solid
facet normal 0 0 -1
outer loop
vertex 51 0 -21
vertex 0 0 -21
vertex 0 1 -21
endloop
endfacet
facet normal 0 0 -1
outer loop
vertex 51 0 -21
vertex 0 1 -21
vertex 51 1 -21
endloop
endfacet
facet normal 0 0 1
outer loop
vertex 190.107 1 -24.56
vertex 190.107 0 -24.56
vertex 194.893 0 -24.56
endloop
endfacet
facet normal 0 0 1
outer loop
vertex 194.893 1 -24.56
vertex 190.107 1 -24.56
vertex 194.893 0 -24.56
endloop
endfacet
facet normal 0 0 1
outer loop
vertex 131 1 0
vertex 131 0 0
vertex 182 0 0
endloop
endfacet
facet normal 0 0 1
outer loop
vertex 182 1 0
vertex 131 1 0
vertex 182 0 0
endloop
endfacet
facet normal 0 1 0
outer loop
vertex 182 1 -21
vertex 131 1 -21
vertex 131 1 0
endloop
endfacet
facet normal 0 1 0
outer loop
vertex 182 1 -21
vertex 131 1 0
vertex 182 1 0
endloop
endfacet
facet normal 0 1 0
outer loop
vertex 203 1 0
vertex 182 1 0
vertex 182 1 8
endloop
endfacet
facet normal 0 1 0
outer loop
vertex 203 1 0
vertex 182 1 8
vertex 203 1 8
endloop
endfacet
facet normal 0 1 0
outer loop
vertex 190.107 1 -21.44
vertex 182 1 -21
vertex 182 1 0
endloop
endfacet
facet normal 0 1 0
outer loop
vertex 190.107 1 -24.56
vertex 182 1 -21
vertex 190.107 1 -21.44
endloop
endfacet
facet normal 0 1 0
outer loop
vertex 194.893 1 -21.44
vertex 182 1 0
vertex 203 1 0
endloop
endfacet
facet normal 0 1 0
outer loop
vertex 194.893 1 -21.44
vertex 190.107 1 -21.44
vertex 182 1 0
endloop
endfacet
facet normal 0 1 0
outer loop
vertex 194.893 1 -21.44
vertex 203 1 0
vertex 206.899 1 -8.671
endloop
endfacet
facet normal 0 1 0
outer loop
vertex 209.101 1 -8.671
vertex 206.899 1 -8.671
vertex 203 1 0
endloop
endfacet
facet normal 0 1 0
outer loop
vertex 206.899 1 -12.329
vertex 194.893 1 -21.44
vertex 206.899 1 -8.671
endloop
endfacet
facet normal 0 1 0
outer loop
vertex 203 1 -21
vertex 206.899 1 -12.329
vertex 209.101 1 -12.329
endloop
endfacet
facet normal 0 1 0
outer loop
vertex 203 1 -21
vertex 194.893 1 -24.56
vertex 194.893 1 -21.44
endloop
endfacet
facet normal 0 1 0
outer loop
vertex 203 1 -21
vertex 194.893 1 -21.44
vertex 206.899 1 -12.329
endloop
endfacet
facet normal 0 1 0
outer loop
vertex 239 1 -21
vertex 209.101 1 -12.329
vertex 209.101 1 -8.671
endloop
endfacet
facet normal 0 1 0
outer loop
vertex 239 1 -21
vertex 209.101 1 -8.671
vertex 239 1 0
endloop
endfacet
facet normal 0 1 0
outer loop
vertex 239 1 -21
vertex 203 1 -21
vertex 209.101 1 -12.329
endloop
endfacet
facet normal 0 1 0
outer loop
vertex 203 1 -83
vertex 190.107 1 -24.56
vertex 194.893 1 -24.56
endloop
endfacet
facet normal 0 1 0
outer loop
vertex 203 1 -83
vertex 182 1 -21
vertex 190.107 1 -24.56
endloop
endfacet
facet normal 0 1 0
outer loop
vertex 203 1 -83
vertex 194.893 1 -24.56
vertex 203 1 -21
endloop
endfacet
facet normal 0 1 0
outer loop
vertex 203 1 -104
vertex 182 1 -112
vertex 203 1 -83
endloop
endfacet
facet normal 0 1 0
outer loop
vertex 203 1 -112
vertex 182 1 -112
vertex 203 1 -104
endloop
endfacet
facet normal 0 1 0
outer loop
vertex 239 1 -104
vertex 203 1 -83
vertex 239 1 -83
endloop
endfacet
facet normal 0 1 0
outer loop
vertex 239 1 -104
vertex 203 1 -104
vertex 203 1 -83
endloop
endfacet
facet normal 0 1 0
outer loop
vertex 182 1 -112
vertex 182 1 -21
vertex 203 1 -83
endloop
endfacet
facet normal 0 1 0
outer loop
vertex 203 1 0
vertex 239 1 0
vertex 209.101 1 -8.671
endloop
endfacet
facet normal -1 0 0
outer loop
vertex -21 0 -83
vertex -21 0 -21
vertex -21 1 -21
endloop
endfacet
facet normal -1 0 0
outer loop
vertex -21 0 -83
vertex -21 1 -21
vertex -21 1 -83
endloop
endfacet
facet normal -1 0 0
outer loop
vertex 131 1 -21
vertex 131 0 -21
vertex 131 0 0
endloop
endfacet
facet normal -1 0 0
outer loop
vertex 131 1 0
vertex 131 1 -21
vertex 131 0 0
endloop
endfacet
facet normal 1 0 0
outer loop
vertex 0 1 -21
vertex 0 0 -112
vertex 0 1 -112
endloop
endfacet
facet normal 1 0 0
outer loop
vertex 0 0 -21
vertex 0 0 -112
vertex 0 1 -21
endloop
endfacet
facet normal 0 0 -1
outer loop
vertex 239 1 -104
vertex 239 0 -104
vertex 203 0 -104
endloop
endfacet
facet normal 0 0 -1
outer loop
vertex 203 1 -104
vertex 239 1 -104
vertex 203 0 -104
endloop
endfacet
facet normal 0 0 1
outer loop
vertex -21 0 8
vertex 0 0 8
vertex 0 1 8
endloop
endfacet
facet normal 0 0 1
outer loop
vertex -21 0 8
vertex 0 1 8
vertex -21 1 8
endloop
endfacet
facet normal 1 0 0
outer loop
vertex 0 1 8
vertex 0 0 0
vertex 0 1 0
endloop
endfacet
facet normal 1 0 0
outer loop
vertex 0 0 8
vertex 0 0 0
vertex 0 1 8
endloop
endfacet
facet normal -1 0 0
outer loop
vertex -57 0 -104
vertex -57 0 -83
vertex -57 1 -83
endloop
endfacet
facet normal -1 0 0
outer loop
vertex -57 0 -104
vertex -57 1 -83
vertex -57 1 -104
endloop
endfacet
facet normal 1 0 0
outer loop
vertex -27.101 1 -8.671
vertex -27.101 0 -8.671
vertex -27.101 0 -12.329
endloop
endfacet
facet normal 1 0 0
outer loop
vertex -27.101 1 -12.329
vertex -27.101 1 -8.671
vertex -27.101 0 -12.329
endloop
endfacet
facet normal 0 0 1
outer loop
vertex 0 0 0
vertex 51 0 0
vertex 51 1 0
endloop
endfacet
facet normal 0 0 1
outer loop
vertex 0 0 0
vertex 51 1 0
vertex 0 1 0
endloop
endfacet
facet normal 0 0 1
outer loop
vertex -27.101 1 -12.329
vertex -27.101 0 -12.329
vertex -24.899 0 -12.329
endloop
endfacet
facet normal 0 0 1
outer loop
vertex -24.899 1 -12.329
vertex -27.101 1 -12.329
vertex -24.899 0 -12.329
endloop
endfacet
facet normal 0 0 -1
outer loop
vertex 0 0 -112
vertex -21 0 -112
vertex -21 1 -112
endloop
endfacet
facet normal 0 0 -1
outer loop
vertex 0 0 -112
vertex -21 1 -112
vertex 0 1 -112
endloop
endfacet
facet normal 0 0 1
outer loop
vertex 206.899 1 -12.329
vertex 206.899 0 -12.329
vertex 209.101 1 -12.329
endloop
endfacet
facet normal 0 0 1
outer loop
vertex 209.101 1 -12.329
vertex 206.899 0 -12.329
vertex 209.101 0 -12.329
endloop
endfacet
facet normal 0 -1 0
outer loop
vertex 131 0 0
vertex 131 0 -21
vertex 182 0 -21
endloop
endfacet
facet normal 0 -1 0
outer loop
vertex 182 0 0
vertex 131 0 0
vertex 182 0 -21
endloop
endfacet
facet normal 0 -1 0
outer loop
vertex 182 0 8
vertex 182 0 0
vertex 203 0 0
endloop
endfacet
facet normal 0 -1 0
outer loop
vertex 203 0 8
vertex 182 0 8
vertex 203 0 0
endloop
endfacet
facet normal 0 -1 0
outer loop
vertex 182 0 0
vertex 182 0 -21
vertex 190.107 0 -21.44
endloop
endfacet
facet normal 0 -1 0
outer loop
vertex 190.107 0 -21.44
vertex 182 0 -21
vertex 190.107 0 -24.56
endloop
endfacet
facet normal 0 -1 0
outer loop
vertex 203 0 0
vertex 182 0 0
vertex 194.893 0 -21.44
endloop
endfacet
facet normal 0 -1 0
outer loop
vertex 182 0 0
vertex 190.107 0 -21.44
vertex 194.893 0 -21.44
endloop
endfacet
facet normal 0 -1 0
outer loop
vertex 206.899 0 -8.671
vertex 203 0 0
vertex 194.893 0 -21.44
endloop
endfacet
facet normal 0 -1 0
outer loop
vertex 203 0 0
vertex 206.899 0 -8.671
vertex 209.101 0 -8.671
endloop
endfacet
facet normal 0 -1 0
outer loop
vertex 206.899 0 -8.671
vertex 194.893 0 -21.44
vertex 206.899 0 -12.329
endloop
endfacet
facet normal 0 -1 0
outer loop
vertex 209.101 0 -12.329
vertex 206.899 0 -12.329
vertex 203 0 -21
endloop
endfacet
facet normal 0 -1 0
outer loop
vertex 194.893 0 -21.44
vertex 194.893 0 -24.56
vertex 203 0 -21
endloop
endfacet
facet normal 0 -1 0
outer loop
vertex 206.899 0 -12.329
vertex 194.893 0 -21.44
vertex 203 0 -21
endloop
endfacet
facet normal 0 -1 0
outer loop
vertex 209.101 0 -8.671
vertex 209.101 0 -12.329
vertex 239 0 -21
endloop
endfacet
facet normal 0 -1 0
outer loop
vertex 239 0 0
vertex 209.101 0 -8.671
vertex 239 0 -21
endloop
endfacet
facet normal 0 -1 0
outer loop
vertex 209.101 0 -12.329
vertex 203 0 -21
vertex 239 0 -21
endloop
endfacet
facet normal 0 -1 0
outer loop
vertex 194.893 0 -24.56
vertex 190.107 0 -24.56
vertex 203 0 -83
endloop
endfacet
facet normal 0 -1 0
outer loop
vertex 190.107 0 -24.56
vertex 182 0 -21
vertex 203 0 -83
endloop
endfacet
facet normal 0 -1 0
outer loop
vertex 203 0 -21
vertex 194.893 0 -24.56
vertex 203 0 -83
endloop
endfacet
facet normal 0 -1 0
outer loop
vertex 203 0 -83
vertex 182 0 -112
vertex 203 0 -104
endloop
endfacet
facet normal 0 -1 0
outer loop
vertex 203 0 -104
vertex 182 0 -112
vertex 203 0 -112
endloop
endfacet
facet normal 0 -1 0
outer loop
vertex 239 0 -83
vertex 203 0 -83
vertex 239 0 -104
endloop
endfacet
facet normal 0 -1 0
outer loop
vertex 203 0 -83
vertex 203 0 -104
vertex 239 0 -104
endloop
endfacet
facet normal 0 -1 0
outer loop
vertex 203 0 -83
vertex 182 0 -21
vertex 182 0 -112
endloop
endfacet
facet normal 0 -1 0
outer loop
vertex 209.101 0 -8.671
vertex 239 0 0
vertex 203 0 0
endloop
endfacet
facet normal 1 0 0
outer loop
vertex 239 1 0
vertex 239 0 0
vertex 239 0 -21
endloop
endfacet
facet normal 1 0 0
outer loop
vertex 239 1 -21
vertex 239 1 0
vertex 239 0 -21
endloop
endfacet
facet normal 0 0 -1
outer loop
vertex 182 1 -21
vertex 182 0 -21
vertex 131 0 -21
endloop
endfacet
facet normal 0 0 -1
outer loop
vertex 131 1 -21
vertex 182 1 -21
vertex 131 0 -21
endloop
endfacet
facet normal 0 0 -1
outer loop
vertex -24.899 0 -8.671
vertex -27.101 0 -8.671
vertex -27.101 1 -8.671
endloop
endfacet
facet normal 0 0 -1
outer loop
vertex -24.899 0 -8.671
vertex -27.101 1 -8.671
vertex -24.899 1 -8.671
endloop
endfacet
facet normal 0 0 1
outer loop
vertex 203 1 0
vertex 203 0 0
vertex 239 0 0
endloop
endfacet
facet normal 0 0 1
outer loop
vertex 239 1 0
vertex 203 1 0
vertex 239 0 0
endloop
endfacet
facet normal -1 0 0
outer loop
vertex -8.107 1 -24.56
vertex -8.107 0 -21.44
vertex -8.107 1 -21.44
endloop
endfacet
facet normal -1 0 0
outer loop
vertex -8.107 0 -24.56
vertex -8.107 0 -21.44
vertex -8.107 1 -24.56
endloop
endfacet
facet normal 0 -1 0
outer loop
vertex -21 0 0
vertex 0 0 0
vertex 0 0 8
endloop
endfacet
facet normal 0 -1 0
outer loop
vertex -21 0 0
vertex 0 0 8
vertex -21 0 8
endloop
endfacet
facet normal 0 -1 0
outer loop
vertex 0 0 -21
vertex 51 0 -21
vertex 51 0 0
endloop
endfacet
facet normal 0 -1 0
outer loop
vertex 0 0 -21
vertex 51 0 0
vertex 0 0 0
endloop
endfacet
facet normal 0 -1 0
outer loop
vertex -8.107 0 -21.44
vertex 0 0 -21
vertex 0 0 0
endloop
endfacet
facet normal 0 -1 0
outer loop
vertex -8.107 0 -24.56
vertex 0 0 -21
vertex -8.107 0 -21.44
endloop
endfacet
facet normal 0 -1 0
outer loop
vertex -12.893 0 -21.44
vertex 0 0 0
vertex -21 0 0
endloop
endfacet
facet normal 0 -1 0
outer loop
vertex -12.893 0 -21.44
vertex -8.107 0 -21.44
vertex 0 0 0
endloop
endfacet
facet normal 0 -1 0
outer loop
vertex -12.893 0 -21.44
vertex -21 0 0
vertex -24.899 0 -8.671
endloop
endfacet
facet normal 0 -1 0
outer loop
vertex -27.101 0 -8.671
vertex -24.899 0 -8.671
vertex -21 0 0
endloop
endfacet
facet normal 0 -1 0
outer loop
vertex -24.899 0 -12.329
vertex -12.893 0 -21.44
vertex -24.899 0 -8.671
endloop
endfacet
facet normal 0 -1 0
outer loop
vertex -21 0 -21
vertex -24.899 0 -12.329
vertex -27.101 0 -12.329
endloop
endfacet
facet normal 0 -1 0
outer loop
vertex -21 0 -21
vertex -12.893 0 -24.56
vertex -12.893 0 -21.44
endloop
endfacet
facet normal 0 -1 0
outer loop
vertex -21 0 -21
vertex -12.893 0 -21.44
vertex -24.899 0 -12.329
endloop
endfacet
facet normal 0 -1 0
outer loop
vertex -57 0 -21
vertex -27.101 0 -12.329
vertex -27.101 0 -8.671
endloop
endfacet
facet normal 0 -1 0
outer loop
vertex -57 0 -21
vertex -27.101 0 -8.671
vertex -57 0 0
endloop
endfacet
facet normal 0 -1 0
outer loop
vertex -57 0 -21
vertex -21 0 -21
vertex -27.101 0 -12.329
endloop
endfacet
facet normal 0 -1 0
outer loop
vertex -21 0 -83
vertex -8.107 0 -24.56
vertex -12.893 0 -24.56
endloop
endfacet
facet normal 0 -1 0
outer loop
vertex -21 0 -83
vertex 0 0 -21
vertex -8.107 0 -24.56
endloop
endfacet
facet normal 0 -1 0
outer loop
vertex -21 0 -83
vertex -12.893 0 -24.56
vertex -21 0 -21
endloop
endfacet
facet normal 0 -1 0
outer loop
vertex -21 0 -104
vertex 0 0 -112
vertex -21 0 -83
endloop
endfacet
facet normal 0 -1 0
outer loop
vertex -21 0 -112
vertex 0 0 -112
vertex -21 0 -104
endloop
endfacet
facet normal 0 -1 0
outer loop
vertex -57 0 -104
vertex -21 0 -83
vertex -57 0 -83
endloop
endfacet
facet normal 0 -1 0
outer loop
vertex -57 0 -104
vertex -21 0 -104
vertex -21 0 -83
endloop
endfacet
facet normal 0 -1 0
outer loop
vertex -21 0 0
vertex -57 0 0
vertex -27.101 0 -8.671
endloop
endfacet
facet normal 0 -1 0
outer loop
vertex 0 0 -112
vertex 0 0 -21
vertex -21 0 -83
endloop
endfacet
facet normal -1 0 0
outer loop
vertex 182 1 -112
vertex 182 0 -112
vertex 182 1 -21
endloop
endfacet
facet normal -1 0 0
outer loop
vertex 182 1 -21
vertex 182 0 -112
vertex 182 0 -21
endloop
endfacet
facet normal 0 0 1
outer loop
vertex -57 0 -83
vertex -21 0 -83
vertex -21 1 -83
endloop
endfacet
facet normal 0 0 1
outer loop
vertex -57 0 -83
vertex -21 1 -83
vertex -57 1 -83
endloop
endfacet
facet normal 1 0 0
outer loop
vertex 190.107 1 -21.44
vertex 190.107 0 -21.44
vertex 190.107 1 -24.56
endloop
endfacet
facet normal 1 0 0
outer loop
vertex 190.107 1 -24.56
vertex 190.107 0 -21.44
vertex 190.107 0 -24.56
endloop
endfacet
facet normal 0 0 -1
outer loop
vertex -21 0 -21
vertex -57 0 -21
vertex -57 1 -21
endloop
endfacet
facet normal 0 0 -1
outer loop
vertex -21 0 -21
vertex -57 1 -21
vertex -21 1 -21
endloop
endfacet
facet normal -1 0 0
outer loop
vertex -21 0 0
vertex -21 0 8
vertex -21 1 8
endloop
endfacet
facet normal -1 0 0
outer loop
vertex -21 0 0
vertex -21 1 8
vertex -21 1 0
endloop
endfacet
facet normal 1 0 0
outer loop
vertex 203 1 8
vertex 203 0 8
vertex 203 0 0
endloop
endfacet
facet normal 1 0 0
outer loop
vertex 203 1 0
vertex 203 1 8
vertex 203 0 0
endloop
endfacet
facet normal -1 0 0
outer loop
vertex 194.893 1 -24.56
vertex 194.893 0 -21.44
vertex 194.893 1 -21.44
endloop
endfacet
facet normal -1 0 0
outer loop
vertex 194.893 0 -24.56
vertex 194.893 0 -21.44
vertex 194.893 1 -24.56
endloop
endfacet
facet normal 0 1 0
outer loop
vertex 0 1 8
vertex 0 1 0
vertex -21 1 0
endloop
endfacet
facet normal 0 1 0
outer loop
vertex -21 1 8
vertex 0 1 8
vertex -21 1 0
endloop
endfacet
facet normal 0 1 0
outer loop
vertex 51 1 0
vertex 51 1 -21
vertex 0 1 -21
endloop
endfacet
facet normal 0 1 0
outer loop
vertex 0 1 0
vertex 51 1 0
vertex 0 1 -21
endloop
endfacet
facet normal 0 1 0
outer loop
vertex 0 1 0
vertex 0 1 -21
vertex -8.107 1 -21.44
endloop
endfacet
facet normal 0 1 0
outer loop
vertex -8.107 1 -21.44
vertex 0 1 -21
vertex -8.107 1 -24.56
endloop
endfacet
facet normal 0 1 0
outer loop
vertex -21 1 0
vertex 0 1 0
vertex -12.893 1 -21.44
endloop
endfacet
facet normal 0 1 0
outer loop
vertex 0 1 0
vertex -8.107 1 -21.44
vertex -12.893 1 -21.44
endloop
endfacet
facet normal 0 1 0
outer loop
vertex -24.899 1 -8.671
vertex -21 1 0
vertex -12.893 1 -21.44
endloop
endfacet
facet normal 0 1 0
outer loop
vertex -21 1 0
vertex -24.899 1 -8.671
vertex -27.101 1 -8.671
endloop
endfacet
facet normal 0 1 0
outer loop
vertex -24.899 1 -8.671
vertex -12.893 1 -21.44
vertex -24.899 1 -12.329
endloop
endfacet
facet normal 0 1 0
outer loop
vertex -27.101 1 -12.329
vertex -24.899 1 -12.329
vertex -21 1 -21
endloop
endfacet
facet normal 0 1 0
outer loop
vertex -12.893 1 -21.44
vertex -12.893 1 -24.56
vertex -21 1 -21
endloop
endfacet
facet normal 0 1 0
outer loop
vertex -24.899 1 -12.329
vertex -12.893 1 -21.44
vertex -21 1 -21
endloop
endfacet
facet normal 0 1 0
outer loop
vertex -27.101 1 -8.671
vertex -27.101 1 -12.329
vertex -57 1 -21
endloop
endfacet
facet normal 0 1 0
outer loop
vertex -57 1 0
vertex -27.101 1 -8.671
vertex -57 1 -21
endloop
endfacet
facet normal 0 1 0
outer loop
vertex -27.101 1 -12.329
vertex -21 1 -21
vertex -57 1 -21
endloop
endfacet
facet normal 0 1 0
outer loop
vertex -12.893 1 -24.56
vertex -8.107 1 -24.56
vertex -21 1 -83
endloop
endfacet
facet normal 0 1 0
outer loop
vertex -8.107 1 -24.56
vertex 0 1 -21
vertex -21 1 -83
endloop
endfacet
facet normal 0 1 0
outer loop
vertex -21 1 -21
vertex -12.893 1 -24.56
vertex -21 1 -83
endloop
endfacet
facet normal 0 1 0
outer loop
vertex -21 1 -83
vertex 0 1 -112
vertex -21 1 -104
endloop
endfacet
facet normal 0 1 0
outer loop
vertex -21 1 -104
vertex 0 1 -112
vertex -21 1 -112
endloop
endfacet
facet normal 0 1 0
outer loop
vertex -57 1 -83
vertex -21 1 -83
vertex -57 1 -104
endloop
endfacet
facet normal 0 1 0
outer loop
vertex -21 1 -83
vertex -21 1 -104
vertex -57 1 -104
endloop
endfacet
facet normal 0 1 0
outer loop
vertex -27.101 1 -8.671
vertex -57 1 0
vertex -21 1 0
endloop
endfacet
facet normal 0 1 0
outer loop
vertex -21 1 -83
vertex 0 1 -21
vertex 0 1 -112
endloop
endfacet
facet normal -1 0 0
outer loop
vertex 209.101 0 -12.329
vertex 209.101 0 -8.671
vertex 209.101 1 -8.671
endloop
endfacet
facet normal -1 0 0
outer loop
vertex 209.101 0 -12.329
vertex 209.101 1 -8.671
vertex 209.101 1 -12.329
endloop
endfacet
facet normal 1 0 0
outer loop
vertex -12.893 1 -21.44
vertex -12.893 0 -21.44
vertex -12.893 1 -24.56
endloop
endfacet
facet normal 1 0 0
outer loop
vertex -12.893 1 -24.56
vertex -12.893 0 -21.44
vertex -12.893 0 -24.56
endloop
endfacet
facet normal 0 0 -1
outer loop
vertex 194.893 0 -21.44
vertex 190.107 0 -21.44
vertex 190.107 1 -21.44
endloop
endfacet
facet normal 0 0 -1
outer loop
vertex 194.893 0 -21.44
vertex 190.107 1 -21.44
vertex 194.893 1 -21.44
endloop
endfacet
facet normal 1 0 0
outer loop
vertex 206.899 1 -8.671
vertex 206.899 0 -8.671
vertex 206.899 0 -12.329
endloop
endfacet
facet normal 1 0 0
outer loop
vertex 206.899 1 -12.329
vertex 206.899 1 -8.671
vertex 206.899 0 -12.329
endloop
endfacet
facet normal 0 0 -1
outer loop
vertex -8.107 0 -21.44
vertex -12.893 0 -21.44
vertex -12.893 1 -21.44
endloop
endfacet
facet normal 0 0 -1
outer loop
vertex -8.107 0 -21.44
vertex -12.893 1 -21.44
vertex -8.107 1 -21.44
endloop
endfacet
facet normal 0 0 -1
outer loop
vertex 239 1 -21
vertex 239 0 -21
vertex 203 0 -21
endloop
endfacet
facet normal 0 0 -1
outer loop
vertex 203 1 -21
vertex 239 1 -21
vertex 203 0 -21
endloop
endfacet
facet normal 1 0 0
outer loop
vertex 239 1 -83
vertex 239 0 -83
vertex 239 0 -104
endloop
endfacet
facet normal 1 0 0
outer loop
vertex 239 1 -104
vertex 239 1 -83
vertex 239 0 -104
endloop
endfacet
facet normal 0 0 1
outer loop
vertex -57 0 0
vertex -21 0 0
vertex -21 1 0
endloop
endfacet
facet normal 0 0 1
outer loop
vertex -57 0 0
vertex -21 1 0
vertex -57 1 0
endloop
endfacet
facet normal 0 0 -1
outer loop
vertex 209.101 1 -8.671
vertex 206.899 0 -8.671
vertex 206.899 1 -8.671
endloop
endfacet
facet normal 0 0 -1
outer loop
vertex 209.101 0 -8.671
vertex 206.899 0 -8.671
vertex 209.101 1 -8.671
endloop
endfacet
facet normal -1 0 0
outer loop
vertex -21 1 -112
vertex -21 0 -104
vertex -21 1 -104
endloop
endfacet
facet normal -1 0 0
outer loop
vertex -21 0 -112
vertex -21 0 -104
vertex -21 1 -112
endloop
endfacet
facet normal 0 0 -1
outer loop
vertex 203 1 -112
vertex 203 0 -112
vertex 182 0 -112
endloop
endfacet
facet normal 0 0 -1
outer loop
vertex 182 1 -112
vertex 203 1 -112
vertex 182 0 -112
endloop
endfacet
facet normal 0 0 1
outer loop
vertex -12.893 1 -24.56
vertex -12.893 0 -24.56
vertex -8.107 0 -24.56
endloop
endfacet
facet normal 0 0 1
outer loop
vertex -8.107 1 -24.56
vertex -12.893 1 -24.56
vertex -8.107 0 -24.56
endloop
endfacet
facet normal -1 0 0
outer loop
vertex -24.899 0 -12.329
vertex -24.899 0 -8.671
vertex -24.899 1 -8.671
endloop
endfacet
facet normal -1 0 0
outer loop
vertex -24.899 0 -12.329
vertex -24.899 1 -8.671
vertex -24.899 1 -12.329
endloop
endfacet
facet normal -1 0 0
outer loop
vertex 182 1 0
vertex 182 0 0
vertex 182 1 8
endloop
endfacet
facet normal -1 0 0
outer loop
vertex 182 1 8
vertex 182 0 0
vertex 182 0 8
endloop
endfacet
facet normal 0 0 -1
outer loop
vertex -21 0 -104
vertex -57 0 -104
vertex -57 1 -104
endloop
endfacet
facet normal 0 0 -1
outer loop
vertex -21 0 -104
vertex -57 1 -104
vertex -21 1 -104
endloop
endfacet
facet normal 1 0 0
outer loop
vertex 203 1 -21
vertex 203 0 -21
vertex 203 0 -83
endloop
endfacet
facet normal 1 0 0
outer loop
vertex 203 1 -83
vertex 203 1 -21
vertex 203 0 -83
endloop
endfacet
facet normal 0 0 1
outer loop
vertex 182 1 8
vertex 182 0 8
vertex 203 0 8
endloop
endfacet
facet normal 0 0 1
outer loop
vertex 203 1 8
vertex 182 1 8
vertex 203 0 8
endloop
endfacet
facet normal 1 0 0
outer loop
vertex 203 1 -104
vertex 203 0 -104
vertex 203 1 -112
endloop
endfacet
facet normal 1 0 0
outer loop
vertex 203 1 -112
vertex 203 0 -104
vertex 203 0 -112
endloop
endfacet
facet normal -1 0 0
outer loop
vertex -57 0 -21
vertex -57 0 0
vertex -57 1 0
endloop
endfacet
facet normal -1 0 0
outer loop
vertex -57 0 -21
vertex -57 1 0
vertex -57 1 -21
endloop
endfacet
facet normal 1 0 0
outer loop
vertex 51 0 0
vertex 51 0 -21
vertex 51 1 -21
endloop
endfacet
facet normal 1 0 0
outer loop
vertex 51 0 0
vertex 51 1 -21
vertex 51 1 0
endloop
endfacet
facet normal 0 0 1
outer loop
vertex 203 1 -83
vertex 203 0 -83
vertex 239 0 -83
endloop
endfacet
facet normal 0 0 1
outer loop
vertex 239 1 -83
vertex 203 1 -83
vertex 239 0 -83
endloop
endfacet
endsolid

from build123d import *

# Parameters (mm, degrees)
SKETCH_1_W        = 2.20243199
SKETCH_1_H        = 3.65801407
SKETCH_1_W_2      = 4.7856148
SKETCH_1_H_2      = 3.120912274
EXTRUDE_1_DEPTH   = 1
EXTRUDE_1_2_DEPTH = 1


with BuildPart() as part:
    # 草图1 → 凸台-拉伸1 (new body)
    with BuildSketch(Plane(origin=(0, 0, 0), x_dir=(1, 0, 0), z_dir=(0, 1, 0))):
        Polygon((0, 0), (0, -8), (-21, -8), (-21, 0), (-57, 0), (-57, 21), (-21, 21), (-21, 83), (-57, 83), (-57, 104), (-21, 104), (-21, 112), (0, 112), (0, 21), (51, 21), (51, 0), align=None)
        with Locations((-26, 10.5)):
            Rectangle(SKETCH_1_W, SKETCH_1_H, mode=Mode.SUBTRACT)
        with Locations((-10.5, 23)):
            Rectangle(SKETCH_1_W_2, SKETCH_1_H_2, mode=Mode.SUBTRACT)
    extrude(amount=EXTRUDE_1_DEPTH)


with BuildPart() as body_2:
    # 草图1 → Extrude 1 2 (new body)
    with BuildSketch(Plane(origin=(0, 0, 0), x_dir=(1, 0, 0), z_dir=(0, 1, 0))):
        Polygon((203, 104), (203, 112), (182, 112), (182, 21), (131, 21), (131, 0), (182, 0), (182, -8), (203, -8), (203, 0), (239, 0), (239, 21), (203, 21), (203, 83), (239, 83), (239, 104), align=None)
        with Locations((192.5, 23)):
            Rectangle(SKETCH_1_W_2, SKETCH_1_H_2, mode=Mode.SUBTRACT)
        with Locations((208, 10.5)):
            Rectangle(SKETCH_1_W, SKETCH_1_H, mode=Mode.SUBTRACT)
    extrude(amount=EXTRUDE_1_2_DEPTH)


solid = Compound([part.part, body_2.part])
